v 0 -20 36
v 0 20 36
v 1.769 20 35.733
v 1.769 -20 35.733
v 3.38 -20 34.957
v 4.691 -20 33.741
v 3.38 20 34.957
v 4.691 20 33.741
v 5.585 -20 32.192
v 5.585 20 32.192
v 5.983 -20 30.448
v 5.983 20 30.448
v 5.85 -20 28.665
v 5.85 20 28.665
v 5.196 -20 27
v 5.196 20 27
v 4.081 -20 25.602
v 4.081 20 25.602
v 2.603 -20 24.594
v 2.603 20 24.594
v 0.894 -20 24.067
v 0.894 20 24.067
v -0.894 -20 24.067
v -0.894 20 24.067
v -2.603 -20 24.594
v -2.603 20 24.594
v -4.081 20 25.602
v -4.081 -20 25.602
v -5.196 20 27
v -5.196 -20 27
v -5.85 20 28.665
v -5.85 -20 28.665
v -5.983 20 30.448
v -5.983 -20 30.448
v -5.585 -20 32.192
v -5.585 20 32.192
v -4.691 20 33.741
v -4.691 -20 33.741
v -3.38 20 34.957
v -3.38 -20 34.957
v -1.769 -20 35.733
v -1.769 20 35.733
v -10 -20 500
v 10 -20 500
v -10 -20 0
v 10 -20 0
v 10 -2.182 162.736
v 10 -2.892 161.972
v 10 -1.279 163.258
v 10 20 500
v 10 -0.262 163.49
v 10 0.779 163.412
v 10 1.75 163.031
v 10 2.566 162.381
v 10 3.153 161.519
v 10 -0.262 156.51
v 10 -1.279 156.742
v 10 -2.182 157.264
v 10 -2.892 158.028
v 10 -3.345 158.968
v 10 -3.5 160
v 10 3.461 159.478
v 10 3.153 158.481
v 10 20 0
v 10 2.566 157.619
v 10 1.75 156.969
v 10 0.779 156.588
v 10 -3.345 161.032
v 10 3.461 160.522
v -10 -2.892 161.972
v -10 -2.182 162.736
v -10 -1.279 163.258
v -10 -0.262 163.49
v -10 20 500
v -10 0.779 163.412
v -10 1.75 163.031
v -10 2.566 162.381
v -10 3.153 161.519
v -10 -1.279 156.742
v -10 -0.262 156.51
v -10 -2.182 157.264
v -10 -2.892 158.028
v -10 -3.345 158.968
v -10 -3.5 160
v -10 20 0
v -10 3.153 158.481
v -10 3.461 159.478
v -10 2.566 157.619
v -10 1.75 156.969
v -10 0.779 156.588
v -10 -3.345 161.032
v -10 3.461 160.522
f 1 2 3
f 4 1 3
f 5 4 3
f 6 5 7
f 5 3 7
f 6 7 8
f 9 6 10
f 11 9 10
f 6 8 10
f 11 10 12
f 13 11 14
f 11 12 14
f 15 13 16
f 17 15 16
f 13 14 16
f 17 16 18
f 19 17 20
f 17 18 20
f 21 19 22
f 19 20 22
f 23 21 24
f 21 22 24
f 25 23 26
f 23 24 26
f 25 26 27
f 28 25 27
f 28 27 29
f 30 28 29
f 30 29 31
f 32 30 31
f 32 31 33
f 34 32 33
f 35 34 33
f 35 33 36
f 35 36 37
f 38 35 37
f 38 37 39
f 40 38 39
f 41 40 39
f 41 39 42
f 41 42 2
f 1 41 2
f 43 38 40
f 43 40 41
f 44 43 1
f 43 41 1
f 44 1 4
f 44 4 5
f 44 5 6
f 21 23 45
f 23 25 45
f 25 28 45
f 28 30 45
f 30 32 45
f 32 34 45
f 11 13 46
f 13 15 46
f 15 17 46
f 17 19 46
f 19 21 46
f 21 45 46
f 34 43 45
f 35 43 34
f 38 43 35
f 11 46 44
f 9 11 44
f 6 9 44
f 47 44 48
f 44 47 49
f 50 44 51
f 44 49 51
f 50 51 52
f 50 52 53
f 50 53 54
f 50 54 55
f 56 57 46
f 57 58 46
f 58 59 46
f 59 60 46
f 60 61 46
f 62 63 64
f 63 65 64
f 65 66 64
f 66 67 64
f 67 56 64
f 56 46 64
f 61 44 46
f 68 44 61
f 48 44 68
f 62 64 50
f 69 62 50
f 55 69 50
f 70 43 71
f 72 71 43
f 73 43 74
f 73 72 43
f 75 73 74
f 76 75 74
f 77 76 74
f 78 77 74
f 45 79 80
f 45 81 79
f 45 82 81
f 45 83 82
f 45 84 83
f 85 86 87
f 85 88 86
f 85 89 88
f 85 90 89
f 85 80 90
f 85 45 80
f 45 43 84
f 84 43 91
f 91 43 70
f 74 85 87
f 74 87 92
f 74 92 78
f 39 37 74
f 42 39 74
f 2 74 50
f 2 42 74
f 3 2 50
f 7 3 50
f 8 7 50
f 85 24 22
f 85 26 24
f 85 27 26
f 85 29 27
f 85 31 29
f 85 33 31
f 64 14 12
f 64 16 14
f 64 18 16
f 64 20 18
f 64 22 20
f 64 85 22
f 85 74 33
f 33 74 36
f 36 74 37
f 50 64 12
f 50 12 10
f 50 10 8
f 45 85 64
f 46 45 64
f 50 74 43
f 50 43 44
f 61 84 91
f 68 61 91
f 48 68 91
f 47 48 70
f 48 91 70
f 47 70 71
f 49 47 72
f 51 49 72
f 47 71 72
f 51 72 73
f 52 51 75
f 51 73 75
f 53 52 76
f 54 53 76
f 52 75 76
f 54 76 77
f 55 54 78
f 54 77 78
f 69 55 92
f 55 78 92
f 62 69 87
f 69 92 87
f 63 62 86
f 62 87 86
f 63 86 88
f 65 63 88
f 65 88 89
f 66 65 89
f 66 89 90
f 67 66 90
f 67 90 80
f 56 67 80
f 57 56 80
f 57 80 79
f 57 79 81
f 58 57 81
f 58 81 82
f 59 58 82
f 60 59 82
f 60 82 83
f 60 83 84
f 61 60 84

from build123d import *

# Parameters (mm, degrees)
SKETCH_2_W          = 20
SKETCH_2_H          = 40
EXTRUDE_6_DEPTH     = 500
SKETCH_3_R          = 6
CUT_EXTRUDE_1_DEPTH = 502.697119784
SKETCH_5_R          = 3.5
CUT_EXTRUDE_2_DEPTH = 501.799361022


with BuildPart() as part:
    # Эскиз2 → Бобышка-Вытянуть6 (new body)
    with BuildSketch(Plane.XY):
        Rectangle(SKETCH_2_W, SKETCH_2_H)
    extrude(amount=EXTRUDE_6_DEPTH)

    # Эскиз3 → Вырез-Вытянуть1 (cut, through all)
    with BuildSketch(Plane(origin=(0, 20, 0), x_dir=(1, 0, 0), z_dir=(0, 1, 0))):
        with Locations(Location((0, -30, 0), (0, 0, 270))):
            Circle(SKETCH_3_R)
    extrude(amount=-CUT_EXTRUDE_1_DEPTH, mode=Mode.SUBTRACT)

    # Эскиз5 → Вырез-Вытянуть2 (cut, through all)
    with BuildSketch(Plane.ZY.offset(10)):
        with Locations(Location((160, 0, 0), (0, 0, 270))):
            Circle(SKETCH_5_R)
    extrude(amount=-CUT_EXTRUDE_2_DEPTH, mode=Mode.SUBTRACT)


solid = part.part
